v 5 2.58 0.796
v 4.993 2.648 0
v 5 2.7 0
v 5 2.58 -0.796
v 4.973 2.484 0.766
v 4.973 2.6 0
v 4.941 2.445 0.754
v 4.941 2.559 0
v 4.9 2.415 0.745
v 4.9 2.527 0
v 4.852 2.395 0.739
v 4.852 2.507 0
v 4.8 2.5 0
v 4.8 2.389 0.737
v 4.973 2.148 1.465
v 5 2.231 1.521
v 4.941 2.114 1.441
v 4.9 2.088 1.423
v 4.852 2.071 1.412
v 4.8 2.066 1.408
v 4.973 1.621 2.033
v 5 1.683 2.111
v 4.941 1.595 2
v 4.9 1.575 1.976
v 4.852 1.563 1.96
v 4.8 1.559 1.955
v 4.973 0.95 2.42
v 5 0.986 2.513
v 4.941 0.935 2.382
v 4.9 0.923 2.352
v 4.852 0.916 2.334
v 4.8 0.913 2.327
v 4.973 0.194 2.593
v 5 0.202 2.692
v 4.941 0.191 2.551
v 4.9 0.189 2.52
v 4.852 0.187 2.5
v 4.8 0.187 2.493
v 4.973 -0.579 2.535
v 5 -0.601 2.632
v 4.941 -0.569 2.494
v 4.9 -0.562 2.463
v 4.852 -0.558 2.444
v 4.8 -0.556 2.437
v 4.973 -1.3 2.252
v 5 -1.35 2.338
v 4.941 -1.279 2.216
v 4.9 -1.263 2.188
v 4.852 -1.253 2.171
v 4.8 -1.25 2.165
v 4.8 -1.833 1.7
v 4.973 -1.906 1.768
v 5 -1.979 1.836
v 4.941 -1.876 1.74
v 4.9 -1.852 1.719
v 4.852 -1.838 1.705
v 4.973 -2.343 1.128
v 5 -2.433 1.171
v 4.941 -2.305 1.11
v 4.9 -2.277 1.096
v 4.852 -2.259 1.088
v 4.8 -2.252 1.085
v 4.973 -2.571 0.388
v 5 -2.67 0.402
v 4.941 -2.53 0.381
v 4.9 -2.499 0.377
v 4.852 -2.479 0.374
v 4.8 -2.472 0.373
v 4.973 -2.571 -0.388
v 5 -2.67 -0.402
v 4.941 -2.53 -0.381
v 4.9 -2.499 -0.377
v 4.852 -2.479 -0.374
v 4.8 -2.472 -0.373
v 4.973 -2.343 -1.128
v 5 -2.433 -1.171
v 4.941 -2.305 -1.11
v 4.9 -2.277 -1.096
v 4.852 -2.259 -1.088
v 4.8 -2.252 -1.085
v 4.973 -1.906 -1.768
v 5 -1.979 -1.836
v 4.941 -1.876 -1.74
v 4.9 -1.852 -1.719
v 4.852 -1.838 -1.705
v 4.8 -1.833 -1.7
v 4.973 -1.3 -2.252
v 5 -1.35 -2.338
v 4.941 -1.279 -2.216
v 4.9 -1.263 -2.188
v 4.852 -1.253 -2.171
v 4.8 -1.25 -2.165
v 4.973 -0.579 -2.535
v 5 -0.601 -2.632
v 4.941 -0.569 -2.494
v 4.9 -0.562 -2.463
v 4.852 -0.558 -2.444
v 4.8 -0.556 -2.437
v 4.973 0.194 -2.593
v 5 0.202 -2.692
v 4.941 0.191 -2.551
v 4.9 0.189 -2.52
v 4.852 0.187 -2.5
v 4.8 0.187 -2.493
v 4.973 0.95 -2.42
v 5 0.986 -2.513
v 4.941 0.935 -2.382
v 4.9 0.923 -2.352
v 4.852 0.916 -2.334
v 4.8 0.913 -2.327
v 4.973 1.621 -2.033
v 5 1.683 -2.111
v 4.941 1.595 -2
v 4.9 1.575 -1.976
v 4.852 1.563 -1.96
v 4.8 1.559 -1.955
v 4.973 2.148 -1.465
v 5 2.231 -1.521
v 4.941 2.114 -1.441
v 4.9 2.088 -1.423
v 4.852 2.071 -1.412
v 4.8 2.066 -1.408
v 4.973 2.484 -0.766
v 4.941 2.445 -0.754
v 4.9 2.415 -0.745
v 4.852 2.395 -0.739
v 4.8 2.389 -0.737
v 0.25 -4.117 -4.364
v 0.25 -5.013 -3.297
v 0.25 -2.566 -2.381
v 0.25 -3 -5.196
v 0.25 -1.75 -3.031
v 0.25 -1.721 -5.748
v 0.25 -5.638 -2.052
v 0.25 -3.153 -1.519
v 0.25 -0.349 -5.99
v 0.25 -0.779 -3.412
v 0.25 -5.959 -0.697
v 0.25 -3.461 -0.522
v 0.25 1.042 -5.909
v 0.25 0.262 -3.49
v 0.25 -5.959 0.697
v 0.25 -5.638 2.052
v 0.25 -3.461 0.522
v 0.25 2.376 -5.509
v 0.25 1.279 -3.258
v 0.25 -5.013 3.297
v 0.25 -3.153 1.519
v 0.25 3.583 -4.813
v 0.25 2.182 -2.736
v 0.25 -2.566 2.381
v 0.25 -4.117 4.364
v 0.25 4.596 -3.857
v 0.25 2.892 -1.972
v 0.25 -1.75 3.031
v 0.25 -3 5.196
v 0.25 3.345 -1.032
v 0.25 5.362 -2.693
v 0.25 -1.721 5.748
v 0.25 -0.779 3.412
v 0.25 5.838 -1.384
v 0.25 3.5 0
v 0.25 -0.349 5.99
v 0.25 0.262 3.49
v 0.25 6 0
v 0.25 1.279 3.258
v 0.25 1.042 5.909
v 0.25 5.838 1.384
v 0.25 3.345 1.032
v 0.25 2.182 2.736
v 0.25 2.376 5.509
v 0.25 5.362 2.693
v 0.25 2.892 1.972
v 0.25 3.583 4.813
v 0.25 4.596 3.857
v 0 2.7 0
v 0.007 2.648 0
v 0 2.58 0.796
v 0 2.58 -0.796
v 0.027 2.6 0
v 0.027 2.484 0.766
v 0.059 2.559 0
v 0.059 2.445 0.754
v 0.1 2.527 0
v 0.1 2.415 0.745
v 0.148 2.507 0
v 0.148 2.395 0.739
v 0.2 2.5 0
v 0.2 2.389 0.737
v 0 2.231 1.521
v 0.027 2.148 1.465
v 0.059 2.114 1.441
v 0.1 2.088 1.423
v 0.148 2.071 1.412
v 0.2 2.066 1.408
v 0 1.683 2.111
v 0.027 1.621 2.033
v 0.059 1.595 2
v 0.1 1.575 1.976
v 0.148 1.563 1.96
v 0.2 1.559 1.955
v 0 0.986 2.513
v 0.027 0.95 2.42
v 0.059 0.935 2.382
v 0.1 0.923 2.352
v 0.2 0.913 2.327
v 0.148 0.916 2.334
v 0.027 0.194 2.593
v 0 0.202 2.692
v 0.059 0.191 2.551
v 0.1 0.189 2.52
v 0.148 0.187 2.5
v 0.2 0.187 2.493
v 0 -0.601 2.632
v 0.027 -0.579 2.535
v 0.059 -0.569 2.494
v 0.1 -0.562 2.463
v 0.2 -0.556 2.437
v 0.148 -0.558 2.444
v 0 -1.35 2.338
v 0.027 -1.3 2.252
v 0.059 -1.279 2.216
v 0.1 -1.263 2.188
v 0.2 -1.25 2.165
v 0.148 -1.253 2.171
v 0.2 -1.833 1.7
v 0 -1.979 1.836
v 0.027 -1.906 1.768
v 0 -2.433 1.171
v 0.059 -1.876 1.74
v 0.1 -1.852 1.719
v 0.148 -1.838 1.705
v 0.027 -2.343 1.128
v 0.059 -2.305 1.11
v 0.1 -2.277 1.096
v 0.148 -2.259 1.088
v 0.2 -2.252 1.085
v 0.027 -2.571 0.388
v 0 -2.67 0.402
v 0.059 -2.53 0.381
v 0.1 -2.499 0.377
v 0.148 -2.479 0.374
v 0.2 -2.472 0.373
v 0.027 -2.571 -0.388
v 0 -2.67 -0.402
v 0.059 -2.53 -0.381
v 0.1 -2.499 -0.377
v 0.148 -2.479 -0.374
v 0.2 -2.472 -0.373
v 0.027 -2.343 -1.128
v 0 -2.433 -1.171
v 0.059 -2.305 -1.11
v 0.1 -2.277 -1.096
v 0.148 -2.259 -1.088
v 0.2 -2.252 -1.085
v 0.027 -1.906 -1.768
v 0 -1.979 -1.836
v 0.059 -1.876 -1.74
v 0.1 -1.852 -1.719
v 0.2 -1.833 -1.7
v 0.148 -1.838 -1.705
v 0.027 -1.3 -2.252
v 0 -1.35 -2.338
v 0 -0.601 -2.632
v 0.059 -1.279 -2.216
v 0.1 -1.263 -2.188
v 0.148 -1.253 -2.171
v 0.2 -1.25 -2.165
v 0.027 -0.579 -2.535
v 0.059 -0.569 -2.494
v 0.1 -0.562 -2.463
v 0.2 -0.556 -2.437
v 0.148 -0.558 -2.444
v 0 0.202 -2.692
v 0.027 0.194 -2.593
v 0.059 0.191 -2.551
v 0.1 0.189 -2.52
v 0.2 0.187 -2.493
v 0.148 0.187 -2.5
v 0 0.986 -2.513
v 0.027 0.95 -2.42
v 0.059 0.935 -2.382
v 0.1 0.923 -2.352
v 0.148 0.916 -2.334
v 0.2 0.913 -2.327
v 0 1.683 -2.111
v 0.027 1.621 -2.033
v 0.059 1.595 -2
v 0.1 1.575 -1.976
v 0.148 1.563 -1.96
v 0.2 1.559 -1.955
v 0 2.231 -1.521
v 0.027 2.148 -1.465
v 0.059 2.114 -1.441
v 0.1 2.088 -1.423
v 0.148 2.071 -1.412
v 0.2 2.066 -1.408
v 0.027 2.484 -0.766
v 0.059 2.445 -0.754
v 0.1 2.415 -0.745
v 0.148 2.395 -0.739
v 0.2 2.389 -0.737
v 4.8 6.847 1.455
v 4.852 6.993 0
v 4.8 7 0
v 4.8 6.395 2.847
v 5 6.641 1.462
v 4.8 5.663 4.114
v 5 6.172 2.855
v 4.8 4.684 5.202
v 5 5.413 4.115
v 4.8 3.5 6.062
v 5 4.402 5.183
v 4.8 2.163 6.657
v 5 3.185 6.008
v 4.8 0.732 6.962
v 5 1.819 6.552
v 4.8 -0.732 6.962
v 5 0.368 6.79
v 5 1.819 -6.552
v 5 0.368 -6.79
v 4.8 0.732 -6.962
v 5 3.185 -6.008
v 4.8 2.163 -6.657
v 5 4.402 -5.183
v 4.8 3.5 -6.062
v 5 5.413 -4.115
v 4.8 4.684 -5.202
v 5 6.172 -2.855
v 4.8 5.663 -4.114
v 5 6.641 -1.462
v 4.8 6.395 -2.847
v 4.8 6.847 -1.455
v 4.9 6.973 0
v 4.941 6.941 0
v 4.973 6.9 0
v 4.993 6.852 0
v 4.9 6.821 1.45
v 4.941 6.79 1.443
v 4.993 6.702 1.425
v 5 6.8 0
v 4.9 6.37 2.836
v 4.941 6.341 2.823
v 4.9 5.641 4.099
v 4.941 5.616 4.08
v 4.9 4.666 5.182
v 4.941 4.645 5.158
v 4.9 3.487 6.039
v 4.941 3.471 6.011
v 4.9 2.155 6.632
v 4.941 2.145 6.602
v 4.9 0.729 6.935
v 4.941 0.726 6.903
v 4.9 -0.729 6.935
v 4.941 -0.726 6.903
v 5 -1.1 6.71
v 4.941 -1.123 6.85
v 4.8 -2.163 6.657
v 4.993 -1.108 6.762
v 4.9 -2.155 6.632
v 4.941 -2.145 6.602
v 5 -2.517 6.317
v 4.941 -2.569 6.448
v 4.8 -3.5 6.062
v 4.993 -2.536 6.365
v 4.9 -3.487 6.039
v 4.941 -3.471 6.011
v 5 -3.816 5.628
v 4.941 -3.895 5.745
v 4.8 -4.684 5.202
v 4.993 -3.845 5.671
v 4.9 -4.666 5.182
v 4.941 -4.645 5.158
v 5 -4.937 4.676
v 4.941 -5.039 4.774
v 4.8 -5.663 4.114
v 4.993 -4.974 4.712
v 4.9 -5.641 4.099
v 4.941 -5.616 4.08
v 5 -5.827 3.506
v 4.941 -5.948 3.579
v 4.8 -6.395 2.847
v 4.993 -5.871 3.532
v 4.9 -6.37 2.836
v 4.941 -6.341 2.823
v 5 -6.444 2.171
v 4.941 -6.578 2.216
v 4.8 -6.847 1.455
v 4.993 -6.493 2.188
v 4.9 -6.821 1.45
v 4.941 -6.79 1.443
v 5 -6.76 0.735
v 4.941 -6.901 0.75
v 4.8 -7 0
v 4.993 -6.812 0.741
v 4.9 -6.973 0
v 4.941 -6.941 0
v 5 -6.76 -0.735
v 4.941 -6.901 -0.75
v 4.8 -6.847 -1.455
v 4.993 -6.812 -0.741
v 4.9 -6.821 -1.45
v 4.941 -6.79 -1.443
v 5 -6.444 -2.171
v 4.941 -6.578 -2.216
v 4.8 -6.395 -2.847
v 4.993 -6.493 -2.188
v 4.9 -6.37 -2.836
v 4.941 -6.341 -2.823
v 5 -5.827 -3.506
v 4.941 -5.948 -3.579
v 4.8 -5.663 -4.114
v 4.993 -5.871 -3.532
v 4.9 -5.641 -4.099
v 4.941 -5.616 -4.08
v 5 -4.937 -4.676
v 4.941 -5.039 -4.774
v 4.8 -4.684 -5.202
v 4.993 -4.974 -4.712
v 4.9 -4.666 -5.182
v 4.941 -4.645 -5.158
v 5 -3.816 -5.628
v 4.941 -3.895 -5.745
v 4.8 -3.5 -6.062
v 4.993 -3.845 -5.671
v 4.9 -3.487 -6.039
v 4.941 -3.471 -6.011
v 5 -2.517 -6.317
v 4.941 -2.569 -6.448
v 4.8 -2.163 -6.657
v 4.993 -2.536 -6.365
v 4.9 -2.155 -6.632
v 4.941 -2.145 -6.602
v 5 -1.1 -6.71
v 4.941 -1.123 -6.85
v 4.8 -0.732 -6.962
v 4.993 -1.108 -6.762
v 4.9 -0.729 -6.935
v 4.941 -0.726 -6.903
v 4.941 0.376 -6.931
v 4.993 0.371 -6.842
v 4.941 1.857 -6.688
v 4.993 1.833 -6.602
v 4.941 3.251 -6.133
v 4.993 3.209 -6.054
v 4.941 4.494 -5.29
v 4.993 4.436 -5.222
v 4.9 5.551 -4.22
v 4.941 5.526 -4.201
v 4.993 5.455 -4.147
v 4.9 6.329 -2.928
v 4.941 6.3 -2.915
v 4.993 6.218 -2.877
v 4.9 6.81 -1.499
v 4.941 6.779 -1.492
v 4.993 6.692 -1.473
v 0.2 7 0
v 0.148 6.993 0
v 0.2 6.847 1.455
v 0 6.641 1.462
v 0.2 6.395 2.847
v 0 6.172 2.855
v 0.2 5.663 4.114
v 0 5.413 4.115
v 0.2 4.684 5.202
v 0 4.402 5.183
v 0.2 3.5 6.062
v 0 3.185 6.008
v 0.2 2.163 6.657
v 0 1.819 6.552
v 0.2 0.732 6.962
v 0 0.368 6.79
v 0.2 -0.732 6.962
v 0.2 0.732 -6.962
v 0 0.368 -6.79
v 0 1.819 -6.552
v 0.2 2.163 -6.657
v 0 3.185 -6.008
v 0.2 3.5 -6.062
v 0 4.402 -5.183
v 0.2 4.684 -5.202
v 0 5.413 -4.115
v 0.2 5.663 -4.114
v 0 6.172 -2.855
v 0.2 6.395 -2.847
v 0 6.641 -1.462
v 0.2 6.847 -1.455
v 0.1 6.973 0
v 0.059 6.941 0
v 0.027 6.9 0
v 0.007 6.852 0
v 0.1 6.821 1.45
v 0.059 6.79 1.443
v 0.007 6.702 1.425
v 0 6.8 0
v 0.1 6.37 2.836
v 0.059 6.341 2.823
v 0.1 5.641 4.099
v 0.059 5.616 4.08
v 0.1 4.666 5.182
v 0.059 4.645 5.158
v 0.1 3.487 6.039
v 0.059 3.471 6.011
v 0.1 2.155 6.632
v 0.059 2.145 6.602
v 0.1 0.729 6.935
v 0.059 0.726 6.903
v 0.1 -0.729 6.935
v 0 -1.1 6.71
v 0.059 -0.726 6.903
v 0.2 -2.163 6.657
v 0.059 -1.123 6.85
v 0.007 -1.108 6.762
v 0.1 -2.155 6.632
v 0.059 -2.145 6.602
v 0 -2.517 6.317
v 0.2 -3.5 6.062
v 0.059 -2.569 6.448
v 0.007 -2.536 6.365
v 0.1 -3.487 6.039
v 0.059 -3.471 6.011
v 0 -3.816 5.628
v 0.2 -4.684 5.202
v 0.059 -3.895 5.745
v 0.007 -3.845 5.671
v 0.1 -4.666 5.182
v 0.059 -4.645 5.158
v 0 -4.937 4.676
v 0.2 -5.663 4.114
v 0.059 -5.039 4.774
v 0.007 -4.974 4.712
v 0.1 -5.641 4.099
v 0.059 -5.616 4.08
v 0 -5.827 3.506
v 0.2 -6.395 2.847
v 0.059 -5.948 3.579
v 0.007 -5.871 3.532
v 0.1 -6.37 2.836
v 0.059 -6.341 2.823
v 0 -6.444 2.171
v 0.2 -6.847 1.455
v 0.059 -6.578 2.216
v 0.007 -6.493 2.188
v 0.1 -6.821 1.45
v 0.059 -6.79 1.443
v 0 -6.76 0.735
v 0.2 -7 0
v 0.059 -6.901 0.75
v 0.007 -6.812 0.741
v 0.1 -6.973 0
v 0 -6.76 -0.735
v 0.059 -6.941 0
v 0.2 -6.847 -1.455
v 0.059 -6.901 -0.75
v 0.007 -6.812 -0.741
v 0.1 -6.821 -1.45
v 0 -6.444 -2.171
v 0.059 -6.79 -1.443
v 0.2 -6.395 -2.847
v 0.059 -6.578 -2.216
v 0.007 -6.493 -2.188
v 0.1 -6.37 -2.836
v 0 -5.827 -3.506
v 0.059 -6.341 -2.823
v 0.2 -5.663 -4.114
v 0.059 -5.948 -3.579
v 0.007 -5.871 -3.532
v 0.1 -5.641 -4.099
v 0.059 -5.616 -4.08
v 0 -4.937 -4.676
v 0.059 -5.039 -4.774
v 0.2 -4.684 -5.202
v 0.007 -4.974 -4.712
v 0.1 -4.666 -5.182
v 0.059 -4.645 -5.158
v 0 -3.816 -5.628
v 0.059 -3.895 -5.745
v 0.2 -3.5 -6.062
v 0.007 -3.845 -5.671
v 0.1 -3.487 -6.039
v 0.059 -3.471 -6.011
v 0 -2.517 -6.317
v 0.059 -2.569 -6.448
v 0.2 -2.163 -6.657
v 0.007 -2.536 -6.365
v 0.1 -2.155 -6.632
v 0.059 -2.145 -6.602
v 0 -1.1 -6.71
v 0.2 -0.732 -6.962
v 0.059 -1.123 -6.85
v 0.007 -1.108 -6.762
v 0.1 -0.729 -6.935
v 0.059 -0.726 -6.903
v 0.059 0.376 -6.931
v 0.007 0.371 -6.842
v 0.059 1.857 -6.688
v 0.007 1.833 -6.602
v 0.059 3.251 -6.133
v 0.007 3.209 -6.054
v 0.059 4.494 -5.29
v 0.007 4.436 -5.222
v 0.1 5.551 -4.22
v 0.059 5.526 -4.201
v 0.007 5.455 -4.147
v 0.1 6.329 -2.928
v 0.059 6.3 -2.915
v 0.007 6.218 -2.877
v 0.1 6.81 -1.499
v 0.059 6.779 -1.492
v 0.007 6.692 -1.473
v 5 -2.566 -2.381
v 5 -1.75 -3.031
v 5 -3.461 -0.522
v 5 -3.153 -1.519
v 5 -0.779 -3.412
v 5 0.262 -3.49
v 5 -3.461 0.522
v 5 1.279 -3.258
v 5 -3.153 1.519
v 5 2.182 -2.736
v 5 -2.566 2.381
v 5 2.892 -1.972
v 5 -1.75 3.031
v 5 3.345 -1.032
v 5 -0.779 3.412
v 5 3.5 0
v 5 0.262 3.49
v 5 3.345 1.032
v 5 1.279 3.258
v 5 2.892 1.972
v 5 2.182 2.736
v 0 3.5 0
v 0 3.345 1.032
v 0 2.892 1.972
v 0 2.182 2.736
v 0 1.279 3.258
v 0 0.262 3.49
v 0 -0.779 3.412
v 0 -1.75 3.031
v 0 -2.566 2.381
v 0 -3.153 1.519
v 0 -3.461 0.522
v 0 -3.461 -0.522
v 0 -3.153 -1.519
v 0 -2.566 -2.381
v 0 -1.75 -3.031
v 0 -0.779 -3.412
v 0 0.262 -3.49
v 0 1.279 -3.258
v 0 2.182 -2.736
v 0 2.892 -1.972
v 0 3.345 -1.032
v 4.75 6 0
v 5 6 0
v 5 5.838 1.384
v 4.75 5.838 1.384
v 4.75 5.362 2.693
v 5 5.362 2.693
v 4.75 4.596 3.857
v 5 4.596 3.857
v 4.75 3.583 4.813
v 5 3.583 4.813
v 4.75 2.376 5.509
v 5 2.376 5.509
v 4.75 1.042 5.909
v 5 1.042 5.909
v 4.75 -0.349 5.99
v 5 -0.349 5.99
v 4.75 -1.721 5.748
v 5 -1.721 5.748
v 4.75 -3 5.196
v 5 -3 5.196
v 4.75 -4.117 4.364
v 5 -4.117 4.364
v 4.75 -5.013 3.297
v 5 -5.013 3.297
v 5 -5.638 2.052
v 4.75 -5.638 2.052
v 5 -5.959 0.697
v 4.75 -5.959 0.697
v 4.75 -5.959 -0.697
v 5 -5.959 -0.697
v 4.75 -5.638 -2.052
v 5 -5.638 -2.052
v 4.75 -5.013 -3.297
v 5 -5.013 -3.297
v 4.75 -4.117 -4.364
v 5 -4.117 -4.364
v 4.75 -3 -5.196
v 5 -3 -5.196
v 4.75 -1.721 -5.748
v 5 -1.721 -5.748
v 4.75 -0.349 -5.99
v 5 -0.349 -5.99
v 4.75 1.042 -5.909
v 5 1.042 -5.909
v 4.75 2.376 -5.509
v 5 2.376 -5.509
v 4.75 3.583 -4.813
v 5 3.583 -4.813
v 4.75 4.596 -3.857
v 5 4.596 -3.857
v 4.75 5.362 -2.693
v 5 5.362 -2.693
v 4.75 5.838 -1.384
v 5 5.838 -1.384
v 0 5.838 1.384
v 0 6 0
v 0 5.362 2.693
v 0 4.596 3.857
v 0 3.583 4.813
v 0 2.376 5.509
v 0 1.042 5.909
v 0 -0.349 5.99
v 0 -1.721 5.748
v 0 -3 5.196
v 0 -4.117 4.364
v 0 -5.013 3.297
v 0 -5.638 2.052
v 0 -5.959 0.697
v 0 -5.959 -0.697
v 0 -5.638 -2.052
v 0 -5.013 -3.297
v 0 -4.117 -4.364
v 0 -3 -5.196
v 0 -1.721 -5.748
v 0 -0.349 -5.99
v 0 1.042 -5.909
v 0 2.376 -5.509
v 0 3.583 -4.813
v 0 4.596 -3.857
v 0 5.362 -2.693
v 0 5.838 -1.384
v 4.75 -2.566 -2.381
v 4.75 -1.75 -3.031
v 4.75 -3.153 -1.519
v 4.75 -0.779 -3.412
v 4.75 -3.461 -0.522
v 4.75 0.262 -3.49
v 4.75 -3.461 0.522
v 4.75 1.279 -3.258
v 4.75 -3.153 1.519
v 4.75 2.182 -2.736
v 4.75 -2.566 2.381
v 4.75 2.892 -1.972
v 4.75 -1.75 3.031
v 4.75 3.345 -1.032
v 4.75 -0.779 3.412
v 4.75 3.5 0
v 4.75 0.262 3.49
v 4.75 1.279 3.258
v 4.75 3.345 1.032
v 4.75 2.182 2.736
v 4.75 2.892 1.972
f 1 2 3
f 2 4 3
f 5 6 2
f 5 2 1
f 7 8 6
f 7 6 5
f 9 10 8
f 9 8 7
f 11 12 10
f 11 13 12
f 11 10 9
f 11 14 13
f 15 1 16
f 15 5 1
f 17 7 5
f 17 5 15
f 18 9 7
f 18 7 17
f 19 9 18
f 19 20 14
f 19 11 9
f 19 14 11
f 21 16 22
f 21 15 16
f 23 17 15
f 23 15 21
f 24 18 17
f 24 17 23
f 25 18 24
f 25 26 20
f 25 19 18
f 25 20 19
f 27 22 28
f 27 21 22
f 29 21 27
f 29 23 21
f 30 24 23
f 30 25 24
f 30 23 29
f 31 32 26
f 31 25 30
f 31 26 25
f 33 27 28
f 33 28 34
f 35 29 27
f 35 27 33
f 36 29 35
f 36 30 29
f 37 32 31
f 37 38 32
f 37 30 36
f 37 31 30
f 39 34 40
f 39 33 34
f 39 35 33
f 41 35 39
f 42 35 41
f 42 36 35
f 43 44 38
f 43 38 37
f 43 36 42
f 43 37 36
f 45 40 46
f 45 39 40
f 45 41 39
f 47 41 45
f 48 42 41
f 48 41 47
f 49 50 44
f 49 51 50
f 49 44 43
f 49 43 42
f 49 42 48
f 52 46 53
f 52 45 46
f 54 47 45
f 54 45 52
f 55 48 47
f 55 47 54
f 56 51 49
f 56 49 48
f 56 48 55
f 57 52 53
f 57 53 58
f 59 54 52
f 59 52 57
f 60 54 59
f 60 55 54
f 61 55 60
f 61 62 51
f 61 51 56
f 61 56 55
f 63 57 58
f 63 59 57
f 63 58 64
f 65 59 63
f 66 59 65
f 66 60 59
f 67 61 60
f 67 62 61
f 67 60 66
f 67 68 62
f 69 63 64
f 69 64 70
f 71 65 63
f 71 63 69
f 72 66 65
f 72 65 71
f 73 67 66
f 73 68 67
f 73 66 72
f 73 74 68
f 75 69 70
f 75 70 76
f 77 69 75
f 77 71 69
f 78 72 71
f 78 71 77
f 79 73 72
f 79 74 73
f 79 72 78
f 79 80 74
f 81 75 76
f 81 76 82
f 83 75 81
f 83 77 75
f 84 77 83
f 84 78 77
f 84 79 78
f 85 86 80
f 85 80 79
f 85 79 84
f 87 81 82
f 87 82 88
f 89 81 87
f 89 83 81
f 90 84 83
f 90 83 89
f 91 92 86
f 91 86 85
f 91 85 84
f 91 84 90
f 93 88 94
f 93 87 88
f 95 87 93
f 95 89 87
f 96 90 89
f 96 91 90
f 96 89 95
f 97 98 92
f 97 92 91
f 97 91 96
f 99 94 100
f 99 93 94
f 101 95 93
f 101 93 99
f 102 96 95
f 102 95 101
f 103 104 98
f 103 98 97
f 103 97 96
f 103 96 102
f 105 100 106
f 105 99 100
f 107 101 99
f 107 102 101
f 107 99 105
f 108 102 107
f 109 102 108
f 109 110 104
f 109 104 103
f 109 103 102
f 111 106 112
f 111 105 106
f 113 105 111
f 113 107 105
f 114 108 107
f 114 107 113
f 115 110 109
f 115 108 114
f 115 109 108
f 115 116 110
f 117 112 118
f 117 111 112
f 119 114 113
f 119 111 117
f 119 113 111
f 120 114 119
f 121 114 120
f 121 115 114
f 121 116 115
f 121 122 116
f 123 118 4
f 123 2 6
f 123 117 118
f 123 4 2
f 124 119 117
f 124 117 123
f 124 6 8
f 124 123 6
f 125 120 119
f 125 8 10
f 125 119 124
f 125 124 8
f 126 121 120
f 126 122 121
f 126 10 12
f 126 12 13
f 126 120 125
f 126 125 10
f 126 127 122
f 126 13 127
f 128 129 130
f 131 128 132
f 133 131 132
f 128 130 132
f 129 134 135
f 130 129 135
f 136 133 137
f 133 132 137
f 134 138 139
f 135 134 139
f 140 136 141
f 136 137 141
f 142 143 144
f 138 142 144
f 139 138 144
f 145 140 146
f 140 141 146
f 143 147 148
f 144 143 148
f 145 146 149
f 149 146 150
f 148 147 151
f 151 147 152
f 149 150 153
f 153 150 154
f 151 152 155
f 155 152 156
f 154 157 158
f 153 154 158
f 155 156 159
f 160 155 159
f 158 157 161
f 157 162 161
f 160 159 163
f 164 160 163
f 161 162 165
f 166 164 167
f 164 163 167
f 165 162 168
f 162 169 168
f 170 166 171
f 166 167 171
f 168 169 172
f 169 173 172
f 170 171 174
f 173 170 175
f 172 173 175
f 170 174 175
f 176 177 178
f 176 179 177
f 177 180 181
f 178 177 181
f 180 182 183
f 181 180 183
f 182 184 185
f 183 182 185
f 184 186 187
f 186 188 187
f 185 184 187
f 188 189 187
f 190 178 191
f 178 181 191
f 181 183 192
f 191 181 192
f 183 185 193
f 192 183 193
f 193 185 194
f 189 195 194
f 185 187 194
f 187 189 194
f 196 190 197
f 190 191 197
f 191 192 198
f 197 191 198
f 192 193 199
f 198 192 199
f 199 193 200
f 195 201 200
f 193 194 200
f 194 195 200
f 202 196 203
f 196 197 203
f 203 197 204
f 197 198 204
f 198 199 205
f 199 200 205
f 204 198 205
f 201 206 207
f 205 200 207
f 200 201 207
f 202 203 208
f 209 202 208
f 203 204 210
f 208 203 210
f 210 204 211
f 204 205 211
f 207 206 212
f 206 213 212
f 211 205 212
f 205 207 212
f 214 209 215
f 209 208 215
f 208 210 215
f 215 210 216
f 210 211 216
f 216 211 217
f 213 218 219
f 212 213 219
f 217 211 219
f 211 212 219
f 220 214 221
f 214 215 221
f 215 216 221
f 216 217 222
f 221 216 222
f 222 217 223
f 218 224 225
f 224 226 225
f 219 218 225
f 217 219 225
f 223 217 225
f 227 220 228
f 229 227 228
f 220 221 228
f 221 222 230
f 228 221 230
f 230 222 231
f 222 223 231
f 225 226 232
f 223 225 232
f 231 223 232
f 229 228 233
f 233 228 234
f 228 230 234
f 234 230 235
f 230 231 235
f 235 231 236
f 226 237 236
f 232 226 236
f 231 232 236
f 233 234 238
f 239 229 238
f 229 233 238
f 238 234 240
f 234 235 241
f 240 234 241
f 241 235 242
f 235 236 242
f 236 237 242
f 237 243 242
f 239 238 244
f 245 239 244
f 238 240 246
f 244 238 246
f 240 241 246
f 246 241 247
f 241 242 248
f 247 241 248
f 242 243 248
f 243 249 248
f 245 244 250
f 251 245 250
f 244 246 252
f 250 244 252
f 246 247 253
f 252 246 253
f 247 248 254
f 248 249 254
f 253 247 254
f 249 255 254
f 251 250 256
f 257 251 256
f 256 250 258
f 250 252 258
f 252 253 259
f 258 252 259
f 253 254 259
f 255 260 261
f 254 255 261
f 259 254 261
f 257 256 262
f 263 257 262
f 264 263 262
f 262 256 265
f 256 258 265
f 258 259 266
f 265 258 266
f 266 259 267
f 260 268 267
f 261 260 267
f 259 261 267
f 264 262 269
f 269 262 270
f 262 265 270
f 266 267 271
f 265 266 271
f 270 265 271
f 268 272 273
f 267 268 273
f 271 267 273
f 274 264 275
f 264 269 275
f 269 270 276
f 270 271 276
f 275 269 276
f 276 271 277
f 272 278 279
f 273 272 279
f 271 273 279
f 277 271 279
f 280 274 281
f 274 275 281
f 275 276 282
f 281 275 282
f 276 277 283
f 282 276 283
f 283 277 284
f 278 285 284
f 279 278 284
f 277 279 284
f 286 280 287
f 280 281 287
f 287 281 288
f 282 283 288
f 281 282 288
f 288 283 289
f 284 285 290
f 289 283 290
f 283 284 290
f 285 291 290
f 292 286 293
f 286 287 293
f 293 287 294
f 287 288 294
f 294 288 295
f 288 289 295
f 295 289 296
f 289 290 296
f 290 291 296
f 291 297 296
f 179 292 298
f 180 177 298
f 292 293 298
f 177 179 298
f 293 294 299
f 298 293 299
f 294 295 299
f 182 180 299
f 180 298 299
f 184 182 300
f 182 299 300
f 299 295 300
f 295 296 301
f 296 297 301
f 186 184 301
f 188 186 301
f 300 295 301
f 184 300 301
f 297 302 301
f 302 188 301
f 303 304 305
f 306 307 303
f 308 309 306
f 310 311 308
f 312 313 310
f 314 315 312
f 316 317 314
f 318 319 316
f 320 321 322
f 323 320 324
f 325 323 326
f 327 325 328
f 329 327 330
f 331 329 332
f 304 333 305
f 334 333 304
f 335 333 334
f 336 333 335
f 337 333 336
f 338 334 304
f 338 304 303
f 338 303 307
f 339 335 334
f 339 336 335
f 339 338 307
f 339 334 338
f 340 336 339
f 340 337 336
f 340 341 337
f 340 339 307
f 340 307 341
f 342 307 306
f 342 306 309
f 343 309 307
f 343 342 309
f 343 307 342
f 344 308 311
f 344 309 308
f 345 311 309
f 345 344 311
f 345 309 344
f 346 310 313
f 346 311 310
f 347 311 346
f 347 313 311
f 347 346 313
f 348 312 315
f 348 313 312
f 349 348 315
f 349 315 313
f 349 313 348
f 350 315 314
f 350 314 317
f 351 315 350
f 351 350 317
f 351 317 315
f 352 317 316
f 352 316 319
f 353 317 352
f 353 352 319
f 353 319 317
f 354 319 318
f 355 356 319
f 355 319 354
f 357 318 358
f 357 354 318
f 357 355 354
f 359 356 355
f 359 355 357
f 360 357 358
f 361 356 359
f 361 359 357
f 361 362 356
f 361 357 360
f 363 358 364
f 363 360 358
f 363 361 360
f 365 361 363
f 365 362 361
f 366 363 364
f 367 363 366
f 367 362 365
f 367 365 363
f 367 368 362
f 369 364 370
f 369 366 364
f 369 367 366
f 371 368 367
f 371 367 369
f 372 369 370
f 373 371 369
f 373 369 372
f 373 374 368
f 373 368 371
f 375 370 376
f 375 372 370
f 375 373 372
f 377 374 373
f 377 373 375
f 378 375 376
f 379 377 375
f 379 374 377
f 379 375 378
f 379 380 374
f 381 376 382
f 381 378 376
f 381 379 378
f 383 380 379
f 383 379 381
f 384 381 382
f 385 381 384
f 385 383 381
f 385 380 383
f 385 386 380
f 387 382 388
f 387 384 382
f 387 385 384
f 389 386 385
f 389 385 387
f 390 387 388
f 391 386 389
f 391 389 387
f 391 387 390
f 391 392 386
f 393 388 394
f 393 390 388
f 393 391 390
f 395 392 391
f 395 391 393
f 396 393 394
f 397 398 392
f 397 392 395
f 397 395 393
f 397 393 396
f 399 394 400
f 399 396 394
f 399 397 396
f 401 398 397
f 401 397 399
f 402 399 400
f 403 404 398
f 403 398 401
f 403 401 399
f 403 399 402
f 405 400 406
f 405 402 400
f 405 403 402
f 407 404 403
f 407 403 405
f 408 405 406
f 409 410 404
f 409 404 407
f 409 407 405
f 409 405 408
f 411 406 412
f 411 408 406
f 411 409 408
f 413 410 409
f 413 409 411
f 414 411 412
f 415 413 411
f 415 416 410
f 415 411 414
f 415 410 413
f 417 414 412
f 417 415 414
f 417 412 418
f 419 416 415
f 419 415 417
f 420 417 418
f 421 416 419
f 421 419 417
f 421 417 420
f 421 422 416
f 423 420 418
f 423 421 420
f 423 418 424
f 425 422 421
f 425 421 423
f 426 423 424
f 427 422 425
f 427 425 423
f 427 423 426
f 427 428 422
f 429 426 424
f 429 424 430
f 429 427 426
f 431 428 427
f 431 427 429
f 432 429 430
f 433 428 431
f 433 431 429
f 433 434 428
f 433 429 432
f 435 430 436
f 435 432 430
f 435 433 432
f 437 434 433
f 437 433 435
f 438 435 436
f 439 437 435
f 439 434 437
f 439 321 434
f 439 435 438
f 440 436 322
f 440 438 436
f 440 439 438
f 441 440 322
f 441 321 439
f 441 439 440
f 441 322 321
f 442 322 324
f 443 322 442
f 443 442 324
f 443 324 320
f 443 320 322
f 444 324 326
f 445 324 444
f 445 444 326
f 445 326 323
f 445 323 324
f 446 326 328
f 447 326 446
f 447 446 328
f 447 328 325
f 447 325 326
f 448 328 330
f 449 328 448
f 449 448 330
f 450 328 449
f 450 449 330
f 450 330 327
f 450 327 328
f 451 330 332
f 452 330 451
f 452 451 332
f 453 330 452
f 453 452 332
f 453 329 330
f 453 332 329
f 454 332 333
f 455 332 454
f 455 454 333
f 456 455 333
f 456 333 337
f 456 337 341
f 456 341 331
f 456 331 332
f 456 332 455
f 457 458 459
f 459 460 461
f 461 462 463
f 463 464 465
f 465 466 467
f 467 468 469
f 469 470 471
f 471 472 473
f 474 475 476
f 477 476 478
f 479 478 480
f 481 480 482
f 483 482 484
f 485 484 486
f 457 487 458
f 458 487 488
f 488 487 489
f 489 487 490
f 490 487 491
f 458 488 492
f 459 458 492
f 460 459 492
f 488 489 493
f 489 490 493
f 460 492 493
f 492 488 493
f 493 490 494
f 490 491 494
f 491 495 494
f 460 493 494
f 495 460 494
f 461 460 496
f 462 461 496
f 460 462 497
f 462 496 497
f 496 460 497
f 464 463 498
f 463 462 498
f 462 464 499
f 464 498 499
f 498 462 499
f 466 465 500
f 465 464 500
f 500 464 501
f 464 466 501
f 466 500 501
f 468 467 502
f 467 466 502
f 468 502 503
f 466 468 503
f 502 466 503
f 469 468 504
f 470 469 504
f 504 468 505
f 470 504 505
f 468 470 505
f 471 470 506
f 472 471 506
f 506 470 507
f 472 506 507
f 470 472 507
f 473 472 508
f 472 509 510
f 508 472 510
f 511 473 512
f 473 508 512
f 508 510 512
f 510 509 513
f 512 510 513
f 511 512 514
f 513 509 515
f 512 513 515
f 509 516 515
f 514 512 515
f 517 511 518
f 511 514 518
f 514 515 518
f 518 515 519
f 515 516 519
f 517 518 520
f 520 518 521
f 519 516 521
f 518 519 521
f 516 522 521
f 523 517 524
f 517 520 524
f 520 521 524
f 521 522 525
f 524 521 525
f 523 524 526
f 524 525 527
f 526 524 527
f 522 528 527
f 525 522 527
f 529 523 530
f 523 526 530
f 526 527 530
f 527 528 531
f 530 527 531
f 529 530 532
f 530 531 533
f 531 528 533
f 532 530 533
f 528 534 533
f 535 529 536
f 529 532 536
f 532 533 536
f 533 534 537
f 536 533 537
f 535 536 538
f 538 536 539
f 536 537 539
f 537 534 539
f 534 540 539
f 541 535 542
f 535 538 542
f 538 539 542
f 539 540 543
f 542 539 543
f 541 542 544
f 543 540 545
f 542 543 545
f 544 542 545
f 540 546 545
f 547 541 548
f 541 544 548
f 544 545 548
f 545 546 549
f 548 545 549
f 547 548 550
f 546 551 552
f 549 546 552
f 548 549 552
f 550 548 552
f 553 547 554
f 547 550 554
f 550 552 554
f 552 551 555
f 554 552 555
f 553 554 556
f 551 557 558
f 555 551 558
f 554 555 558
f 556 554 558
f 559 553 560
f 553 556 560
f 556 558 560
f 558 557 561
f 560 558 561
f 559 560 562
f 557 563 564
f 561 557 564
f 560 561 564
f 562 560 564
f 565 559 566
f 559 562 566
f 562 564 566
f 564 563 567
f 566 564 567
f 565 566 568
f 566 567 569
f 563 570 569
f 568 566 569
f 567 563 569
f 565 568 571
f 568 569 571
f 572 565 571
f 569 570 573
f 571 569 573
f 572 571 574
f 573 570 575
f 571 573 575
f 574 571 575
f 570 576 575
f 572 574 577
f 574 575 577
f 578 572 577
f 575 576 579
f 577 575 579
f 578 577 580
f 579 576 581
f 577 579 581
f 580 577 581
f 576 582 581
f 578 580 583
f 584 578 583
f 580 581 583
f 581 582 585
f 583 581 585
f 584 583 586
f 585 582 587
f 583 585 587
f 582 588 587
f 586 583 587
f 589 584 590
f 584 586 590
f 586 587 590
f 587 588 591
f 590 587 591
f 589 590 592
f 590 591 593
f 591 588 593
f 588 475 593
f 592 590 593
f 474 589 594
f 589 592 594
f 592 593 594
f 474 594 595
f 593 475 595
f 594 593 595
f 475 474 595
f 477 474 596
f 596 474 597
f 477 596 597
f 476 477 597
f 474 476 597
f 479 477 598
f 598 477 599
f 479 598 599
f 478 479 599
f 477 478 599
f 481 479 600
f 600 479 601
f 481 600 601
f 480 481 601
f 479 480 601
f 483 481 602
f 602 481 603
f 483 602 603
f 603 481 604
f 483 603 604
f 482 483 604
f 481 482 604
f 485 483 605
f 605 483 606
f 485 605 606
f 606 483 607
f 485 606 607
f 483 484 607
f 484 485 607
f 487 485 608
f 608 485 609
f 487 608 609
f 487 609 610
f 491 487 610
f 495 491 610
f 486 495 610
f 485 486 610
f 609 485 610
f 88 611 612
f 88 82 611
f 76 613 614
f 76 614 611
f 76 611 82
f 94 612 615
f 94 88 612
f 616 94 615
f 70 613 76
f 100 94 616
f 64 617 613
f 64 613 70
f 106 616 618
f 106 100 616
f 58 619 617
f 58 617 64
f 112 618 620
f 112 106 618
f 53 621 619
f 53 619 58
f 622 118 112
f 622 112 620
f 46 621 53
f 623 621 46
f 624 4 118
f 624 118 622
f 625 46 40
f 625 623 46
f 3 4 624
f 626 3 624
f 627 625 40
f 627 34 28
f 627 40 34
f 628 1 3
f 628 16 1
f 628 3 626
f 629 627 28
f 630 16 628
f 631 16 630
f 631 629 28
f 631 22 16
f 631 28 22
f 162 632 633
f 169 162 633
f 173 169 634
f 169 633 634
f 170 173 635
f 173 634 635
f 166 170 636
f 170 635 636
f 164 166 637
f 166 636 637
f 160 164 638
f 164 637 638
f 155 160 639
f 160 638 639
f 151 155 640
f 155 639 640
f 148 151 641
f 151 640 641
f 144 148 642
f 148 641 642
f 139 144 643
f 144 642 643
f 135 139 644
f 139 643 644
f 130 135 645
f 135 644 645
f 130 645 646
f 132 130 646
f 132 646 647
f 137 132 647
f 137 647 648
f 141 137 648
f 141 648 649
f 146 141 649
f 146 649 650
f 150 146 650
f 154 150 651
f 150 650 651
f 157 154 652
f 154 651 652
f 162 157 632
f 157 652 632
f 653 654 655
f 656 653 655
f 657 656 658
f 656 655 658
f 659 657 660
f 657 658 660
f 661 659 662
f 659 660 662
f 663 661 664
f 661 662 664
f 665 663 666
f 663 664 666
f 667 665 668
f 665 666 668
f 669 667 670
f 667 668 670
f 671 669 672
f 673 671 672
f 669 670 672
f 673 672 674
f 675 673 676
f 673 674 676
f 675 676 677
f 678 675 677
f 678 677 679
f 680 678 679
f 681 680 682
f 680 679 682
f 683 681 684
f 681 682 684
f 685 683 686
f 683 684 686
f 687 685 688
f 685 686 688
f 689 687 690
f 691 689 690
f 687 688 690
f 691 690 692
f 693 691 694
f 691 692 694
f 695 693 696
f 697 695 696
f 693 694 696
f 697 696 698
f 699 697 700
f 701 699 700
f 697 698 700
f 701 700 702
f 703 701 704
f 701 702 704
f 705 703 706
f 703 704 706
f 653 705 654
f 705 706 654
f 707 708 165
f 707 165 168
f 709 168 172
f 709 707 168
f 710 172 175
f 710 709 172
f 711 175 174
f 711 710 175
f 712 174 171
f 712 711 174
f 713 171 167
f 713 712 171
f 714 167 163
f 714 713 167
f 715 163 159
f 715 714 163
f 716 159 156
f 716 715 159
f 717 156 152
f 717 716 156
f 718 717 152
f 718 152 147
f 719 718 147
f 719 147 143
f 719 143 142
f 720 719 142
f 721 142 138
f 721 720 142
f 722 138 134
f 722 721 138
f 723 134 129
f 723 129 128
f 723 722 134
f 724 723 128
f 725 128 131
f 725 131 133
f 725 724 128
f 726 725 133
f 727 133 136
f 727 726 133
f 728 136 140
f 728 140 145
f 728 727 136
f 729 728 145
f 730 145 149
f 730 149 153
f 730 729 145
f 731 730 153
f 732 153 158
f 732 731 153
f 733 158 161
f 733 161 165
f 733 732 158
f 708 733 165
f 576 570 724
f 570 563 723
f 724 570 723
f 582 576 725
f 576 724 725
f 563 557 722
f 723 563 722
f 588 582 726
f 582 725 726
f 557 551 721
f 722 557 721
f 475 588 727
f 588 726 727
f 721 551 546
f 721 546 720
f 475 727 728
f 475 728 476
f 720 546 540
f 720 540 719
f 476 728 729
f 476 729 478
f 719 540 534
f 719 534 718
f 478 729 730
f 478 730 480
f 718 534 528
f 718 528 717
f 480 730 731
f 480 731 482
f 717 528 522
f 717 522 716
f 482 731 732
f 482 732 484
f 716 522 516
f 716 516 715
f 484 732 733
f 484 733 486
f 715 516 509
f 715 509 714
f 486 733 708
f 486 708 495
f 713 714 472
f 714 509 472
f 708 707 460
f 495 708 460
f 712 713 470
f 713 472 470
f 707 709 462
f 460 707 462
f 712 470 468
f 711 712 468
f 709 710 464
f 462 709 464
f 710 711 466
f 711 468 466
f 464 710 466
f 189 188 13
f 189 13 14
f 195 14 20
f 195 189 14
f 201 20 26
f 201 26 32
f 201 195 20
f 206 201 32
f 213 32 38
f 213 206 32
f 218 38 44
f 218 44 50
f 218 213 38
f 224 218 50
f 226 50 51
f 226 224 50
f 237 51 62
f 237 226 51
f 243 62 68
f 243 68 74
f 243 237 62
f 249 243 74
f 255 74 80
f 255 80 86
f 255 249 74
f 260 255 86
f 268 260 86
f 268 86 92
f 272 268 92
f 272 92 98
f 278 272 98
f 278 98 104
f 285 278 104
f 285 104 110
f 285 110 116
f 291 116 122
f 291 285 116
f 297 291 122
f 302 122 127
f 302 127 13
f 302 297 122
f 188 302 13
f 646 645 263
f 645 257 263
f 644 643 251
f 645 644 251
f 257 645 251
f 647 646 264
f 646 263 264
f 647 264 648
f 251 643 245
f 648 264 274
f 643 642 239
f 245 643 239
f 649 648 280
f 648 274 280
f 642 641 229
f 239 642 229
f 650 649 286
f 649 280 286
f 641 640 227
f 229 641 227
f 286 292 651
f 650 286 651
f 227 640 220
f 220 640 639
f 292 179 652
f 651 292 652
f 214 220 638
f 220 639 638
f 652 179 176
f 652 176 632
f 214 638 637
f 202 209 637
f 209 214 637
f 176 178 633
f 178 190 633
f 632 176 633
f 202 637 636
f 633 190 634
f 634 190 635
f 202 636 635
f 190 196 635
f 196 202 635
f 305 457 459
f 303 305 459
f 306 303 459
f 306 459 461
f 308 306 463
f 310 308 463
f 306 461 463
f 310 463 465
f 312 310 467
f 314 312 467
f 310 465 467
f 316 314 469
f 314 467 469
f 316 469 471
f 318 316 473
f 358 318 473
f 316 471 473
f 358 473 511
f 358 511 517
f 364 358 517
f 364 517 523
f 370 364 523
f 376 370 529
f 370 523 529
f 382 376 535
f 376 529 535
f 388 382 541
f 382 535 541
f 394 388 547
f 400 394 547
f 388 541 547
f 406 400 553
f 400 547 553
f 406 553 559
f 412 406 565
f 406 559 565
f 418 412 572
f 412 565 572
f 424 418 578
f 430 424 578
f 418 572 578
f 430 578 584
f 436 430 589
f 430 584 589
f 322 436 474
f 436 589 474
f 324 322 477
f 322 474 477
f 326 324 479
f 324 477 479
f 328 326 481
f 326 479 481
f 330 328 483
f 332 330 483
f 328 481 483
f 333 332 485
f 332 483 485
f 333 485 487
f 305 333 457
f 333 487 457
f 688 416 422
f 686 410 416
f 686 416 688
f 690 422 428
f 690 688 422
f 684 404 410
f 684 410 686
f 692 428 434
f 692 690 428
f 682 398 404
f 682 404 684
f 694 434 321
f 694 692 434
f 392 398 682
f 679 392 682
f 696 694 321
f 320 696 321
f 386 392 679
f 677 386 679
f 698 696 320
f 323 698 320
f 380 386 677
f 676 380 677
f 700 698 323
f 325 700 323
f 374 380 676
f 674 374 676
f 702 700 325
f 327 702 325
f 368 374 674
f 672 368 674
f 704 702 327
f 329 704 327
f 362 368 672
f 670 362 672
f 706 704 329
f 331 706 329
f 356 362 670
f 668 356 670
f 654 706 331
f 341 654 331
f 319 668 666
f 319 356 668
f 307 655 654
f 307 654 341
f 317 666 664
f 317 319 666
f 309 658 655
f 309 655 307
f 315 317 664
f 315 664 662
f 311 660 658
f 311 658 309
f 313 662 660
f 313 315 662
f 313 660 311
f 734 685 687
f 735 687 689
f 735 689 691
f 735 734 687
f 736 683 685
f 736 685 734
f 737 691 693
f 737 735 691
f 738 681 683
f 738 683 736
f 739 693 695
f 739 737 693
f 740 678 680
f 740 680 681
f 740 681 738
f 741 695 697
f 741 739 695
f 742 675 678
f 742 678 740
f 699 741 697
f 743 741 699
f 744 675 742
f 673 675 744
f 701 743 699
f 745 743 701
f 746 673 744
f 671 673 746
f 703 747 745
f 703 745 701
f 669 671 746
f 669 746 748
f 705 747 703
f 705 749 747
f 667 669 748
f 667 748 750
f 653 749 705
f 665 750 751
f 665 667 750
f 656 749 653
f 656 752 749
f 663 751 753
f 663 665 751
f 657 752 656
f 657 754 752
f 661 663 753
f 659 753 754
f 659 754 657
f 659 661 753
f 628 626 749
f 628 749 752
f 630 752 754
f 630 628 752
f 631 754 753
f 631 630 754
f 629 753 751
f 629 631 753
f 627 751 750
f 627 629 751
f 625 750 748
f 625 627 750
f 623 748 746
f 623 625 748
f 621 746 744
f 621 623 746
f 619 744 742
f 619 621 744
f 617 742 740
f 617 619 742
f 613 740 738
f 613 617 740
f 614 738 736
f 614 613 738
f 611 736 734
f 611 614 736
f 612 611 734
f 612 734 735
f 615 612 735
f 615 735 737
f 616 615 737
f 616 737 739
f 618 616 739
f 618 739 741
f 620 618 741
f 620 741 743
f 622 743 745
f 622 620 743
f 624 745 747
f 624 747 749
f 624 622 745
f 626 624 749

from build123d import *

# Parameters (mm, degrees)
F0_R     = 7
F0_R_2   = 2.5
F1_DEPTH = 5
F2_R     = 6
F2_R_2   = 3.5
F3_DEPTH = 0.25
F4_R     = 6
F4_R_2   = 3.5
F5_DEPTH = 0.25
F6_R     = 0.2


with BuildPart() as f1:
    # F0 (on Right) → F1 (new body)
    with BuildSketch(Plane.YZ):
        Circle(F0_R)
        Circle(F0_R_2, mode=Mode.SUBTRACT)
    extrude(amount=F1_DEPTH)

    # F2 (on Right) → F3 (cut)
    with BuildSketch(Plane.YZ):
        Circle(F2_R)
        Circle(F2_R_2, mode=Mode.SUBTRACT)
    extrude(amount=F3_DEPTH, mode=Mode.SUBTRACT)

    # F4 (on face) → F5 (cut)
    with BuildSketch(Plane.YZ.offset(5)):
        Circle(F4_R)
        Circle(F4_R_2, mode=Mode.SUBTRACT)
    extrude(amount=-F5_DEPTH, mode=Mode.SUBTRACT)

    # F6
    f6_edges = [f1.edges().sort_by_distance(p)[0] for p in [
        (2.5, 7, 0),
        (0, -7, 0),
        (5, -7, 0),
        (2.5, 2.5, 0),
        (0, -2.5, 0),
        (5, -2.5, 0),
    ]]
    fillet(f6_edges, radius=F6_R)


solid = f1.part
